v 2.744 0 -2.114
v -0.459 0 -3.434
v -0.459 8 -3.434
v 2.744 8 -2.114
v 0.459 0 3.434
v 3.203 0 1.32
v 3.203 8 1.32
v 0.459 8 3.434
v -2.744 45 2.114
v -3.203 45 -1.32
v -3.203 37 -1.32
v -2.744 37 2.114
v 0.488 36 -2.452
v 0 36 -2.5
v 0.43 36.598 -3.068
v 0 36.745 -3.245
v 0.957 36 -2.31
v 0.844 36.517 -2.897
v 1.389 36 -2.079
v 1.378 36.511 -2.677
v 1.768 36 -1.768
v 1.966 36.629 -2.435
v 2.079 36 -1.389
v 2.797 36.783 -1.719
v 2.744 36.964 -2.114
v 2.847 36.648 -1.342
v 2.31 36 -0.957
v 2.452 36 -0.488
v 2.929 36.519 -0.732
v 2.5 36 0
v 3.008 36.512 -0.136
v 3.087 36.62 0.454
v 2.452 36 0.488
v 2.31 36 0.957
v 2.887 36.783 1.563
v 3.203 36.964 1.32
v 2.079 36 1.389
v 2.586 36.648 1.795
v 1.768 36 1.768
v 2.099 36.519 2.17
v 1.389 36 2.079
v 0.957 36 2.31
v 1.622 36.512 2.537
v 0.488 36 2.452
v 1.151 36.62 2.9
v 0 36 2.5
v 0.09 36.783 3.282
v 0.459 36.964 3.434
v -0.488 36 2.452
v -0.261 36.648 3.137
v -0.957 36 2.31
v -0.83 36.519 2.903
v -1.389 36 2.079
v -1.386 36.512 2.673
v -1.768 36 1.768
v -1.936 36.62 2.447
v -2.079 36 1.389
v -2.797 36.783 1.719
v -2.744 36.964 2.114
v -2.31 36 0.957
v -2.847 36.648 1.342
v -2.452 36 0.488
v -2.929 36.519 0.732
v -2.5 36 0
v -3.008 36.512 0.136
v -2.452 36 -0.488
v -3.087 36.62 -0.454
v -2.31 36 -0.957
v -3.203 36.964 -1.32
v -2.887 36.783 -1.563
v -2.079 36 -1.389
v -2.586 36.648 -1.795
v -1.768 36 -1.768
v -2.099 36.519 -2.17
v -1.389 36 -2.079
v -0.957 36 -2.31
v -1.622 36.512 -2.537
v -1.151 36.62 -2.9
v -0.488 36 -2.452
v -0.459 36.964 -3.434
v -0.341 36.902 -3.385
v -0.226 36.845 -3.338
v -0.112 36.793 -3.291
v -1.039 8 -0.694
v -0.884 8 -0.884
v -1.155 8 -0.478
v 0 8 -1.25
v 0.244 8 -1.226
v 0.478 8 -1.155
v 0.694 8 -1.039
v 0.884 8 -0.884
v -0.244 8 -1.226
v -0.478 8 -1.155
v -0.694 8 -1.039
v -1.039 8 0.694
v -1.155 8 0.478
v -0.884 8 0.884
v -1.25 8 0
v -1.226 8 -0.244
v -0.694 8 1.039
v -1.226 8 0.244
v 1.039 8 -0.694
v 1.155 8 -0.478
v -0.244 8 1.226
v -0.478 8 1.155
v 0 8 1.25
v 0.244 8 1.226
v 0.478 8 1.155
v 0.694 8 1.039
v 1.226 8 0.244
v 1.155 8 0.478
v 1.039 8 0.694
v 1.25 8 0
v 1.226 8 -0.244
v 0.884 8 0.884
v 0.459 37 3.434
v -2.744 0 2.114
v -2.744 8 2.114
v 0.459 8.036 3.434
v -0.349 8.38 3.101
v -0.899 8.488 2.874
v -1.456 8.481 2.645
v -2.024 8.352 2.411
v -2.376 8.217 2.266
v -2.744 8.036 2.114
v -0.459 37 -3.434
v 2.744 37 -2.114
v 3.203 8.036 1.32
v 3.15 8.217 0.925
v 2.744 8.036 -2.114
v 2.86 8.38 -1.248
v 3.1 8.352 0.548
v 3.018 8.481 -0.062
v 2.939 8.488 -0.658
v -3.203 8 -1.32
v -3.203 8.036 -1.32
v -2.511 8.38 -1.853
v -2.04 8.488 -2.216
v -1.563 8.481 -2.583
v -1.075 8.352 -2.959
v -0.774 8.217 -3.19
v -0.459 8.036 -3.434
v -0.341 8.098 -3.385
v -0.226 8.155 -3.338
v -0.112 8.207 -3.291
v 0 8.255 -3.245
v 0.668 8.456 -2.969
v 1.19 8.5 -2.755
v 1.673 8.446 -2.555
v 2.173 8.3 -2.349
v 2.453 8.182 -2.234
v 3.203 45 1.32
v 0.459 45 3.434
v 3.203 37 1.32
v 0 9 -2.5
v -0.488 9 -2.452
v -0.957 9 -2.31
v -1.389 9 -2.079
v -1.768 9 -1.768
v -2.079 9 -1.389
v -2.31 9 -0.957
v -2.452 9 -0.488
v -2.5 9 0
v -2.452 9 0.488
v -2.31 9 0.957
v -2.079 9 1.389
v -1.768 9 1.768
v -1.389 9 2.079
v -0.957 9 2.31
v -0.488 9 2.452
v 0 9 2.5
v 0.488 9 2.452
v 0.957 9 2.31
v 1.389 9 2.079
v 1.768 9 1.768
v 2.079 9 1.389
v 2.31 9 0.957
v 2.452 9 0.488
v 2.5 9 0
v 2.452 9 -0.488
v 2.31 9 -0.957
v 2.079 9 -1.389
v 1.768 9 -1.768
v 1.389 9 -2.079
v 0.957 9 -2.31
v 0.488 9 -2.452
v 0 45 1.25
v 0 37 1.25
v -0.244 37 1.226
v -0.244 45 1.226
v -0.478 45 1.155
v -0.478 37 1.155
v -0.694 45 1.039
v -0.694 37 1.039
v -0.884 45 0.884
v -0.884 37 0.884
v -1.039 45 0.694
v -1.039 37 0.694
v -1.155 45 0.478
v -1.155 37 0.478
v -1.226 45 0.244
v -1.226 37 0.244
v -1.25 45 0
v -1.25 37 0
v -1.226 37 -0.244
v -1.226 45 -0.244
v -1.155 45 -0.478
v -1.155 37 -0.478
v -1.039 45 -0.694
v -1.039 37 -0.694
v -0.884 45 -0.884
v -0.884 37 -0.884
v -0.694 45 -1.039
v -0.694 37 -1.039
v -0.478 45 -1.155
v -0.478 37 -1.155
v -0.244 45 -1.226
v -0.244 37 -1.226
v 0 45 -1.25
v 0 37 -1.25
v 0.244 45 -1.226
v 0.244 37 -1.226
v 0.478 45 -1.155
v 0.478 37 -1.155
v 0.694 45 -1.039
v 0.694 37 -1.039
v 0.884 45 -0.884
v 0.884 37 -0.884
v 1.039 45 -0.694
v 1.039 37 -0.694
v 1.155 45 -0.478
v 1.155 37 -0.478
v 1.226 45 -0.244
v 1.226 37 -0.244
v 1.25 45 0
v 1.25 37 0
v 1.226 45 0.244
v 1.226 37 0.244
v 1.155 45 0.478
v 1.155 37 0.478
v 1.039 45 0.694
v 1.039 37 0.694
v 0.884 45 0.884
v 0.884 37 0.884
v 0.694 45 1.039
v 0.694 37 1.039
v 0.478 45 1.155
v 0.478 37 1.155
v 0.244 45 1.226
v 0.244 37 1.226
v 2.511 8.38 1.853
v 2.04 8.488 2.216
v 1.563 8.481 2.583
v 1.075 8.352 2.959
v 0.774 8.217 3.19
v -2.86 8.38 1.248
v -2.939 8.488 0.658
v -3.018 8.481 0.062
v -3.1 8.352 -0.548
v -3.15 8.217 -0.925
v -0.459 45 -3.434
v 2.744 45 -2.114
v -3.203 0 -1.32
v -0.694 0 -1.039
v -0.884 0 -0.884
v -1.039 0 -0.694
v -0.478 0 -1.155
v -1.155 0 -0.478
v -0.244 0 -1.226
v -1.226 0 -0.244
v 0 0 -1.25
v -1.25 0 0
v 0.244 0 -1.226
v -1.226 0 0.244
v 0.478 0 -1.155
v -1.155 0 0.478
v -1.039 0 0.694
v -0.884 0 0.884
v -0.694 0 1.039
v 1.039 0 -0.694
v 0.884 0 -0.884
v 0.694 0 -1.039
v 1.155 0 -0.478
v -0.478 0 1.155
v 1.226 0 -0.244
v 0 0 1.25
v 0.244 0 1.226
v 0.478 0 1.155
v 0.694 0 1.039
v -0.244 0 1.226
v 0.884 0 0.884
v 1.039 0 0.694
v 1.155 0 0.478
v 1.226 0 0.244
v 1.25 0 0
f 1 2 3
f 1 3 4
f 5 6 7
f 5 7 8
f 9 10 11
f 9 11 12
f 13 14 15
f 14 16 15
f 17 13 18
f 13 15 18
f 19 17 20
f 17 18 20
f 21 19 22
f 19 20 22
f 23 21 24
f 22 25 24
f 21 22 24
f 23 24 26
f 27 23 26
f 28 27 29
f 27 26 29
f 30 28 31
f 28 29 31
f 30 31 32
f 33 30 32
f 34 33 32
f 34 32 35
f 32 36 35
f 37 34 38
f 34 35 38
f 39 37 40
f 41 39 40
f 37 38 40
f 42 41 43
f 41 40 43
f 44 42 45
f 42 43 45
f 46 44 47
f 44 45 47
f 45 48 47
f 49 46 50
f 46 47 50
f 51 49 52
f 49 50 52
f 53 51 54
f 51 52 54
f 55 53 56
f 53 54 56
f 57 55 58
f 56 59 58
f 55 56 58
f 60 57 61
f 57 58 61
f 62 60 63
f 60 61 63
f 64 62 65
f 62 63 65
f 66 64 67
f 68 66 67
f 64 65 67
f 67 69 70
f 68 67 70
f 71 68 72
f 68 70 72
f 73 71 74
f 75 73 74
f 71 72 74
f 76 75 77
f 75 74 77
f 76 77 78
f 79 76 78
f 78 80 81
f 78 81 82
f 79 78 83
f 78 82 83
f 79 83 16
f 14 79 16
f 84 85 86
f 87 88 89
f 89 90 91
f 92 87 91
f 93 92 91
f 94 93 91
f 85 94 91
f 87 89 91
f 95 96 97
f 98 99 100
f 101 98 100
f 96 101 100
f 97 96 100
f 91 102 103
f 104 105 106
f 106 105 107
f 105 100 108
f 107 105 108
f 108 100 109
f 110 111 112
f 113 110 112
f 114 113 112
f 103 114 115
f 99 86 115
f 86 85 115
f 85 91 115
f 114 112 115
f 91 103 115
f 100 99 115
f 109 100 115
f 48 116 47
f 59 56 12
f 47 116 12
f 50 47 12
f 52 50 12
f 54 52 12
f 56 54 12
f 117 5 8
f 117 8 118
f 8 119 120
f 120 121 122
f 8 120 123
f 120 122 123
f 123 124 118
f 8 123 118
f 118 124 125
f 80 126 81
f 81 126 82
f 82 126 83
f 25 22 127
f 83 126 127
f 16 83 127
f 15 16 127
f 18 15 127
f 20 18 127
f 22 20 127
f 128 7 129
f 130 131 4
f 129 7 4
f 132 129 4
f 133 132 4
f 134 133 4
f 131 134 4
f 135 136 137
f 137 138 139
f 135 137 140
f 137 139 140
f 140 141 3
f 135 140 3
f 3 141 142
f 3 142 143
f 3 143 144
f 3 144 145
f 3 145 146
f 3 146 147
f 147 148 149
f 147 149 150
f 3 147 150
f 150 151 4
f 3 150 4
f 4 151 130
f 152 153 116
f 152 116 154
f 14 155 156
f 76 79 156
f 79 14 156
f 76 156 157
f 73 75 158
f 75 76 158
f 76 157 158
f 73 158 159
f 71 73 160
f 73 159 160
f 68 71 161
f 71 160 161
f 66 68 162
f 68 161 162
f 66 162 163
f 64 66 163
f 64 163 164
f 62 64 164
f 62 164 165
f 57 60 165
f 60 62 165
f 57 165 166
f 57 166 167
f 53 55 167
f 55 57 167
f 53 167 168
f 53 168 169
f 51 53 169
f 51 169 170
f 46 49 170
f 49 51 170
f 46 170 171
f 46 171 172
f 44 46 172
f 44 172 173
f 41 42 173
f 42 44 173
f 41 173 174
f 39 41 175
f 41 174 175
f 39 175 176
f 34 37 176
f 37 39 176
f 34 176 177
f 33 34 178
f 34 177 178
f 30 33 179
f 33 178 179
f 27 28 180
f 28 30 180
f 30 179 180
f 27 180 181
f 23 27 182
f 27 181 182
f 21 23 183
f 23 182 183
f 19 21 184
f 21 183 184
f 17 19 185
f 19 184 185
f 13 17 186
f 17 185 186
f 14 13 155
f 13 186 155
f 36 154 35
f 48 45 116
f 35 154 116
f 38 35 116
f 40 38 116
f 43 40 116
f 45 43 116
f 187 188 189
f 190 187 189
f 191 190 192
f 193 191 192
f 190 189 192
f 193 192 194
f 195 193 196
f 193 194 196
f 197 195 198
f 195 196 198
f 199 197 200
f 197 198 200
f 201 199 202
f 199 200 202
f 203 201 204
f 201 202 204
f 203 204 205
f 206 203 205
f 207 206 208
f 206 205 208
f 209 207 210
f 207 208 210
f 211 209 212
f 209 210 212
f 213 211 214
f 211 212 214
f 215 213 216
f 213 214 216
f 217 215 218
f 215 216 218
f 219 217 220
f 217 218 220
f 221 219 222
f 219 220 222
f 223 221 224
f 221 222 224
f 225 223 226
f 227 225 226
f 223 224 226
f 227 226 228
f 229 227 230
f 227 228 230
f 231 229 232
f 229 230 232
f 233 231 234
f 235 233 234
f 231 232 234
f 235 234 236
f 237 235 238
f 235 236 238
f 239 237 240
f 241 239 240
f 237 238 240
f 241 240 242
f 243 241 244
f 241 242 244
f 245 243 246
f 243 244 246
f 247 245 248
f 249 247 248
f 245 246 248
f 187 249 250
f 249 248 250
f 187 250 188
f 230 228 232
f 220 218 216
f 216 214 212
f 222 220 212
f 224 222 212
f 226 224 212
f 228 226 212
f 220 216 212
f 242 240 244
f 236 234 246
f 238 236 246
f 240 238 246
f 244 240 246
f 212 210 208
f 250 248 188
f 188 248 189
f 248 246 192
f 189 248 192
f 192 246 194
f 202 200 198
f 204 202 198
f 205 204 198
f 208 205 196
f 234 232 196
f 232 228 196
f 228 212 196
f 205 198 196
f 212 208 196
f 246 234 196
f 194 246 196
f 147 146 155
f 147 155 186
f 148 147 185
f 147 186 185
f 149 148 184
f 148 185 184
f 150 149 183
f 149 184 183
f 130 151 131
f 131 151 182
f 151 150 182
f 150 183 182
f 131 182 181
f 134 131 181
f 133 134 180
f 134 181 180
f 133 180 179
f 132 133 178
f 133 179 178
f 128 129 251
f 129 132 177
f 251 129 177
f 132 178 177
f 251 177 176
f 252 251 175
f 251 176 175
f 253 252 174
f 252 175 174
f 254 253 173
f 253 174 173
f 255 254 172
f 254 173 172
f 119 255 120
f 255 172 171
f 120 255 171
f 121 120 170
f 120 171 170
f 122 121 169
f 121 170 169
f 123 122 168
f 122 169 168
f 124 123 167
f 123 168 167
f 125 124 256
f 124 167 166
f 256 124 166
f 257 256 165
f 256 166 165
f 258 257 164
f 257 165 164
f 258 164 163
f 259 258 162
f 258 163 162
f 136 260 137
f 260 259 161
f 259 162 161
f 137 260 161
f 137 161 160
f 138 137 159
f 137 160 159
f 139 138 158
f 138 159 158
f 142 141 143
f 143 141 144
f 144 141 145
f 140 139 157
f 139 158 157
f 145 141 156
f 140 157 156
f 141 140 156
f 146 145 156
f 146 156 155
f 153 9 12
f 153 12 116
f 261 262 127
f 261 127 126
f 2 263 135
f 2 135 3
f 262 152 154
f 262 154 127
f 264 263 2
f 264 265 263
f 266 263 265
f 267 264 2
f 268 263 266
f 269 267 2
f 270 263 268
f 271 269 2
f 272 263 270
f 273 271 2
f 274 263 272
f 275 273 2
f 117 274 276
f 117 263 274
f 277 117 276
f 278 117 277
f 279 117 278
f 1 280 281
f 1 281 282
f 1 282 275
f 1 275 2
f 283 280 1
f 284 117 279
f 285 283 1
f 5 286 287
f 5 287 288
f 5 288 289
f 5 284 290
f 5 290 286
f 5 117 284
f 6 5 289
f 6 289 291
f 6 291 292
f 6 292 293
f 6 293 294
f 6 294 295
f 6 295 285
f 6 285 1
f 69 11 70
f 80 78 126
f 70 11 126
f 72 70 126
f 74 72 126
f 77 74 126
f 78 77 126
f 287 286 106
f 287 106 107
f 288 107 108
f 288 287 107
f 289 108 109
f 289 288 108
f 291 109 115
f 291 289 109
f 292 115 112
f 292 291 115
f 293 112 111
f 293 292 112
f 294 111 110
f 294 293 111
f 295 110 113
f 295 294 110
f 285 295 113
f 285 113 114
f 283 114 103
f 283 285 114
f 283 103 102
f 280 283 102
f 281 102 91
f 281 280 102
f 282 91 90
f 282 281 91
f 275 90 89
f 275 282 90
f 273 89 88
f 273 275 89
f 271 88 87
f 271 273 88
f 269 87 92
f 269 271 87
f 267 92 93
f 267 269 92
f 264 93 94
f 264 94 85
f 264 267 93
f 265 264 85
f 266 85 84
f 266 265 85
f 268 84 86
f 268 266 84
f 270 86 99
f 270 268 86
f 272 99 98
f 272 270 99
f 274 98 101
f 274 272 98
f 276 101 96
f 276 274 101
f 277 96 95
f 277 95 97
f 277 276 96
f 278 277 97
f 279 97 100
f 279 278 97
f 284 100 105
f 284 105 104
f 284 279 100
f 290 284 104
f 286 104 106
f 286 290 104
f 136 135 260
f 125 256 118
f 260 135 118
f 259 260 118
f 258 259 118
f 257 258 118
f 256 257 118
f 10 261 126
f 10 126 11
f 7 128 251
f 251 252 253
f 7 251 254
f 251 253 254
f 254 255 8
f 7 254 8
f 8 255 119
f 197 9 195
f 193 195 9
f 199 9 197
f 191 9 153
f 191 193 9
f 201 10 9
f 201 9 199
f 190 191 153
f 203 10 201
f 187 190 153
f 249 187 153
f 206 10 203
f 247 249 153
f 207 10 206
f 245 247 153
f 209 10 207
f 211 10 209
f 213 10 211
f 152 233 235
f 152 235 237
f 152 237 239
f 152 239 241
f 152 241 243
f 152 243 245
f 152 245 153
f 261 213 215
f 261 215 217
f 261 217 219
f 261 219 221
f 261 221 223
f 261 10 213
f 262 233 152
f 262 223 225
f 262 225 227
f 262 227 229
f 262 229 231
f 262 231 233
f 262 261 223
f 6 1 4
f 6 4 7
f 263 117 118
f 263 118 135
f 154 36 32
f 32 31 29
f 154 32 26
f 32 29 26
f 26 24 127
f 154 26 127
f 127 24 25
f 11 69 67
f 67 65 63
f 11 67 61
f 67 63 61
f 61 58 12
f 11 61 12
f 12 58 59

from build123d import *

# Parameters (mm, degrees)
SKETCH_1_R          = 2.5
EXTRUDE_1_DEPTH     = 45
EXTRUDE_2_DEPTH     = 8
EXTRUDE_3_DEPTH     = 8
CHAMFER_1_SIZE      = 1
SKETCH_4_R          = 1.25
CUT_EXTRUDE_1_DEPTH = 8
CUT_EXTRUDE_START   = 8
SKETCH_5_R          = 1.25
CUT_EXTRUDE_2_DEPTH = 8


with BuildPart() as part:
    # 草图1 → 凸台-拉伸1 (new body)
    with BuildSketch(Plane(origin=(0, 0, 0), x_dir=(1, 0, 0), z_dir=(0, 1, 0))):
        with Locations(Location((0, 0, 0), (0, 0, 90))):
            Circle(SKETCH_1_R)
    extrude(amount=EXTRUDE_1_DEPTH)

    # 草图2 → 凸台-拉伸2 (add)
    with BuildSketch(Plane(origin=(0, 45, 0), x_dir=(1, 0, 0), z_dir=(0, 1, 0))):
        Polygon((3.202903935, -1.319623577), (2.744279509, 2.113984385), (-0.458624426, 3.433607962), (-3.202903935, 1.319623577), (-2.744279509, -2.113984385), (0.458624426, -3.433607962), align=None)
    extrude(amount=-EXTRUDE_2_DEPTH)

    # 草图3 → 凸台-拉伸3 (add)
    with BuildSketch(Plane.XZ):
        Polygon((3.202903935, 1.319623577), (0.458624426, 3.433607962), (-2.744279509, 2.113984385), (-3.202903935, -1.319623577), (-0.458624426, -3.433607962), (2.744279509, -2.113984385), align=None)
    extrude(amount=-EXTRUDE_3_DEPTH)

    # 倒角1
    # the kernel refuses this chamfer: 1 mm, written as the material it adds along each edge
    with BuildSketch(Plane(origin=(0, 37, 0), x_dir=(0, 0, -1), z_dir=(-1, 0, 0))) as chamfer_1_piece_1_section:
        Polygon((2.5, CHAMFER_1_SIZE), (2.5 + CHAMFER_1_SIZE, 0), (2.5, 0), align=None)
    chamfer_1_piece_1 = revolve(axis=Axis((0, 37, 0), (0, -1, 0)), mode=Mode.PRIVATE)
    chamfer_1_piece_1 = split(chamfer_1_piece_1, bisect_by=Plane(origin=(3.361202761, 36.482096178, 2.504767848), z_dir=(-0.9911972405355005, 0, 0.13239346794615373)), keep=Keep.TOP, mode=Mode.PRIVATE)
    chamfer_1_piece_1 = split(chamfer_1_piece_1, bisect_by=Plane(origin=(0.402796537, 36.482096178, 3.476613525), z_dir=(-0.61025472680424, 0, -0.7922052564917015)), keep=Keep.TOP, mode=Mode.PRIVATE)
    chamfer_1_piece_1 = split(chamfer_1_piece_1, bisect_by=Plane(origin=(2.183184145, 36.482096178, -2.345160432), z_dir=(-0.3809425137312606, 0, 0.924598724437855)), keep=Keep.TOP, mode=Mode.PRIVATE)
    chamfer_1_piece_1 = split(chamfer_1_piece_1, bisect_by=Plane(origin=(-0.102470937, 36.482096178, 3.202431915), z_dir=(0.38094251373126053, 0, -0.924598724437855)), keep=Keep.TOP, mode=Mode.PRIVATE)
    chamfer_1_piece_1 = split(chamfer_1_piece_1, bisect_by=Plane(origin=(-3.258731824, 36.482096178, -1.276618014), z_dir=(0.6102547268042401, 0, 0.7922052564917015)), keep=Keep.TOP, mode=Mode.PRIVATE)
    chamfer_1_piece_1 = split(chamfer_1_piece_1, bisect_by=Plane(origin=(-2.585980682, 36.482096178, 3.299128656), z_dir=(0.9911972405355005, 0, -0.1323934679461537)), keep=Keep.TOP, mode=Mode.PRIVATE)
    add(chamfer_1_piece_1)
    with BuildSketch(Plane(origin=(0, 8, 0), x_dir=(0, 0, -1), z_dir=(-1, 0, 0))) as chamfer_1_piece_2_section:
        Polygon((2.5 + CHAMFER_1_SIZE, 0), (2.5, -CHAMFER_1_SIZE), (2.5, 0), align=None)
    chamfer_1_piece_2 = revolve(axis=Axis((0, 8, 0), (0, -1, 0)), mode=Mode.PRIVATE)
    chamfer_1_piece_2 = split(chamfer_1_piece_2, bisect_by=Plane(origin=(0.402796537, 8.517903822, 3.476613525), z_dir=(-0.61025472680424, 0, -0.7922052564917015)), keep=Keep.TOP, mode=Mode.PRIVATE)
    chamfer_1_piece_2 = split(chamfer_1_piece_2, bisect_by=Plane(origin=(3.361202761, 8.517903822, 2.504767848), z_dir=(-0.9911972405355005, 0, 0.13239346794615373)), keep=Keep.TOP, mode=Mode.PRIVATE)
    chamfer_1_piece_2 = split(chamfer_1_piece_2, bisect_by=Plane(origin=(-0.102470937, 8.517903822, 3.202431915), z_dir=(0.38094251373126053, 0, -0.924598724437855)), keep=Keep.TOP, mode=Mode.PRIVATE)
    chamfer_1_piece_2 = split(chamfer_1_piece_2, bisect_by=Plane(origin=(2.183184145, 8.517903822, -2.345160432), z_dir=(-0.3809425137312606, 0, 0.924598724437855)), keep=Keep.TOP, mode=Mode.PRIVATE)
    chamfer_1_piece_2 = split(chamfer_1_piece_2, bisect_by=Plane(origin=(-2.585980682, 8.517903822, 3.299128656), z_dir=(0.9911972405355005, 0, -0.1323934679461537)), keep=Keep.TOP, mode=Mode.PRIVATE)
    chamfer_1_piece_2 = split(chamfer_1_piece_2, bisect_by=Plane(origin=(-3.258731824, 8.517903822, -1.276618014), z_dir=(0.6102547268042401, 0, 0.7922052564917015)), keep=Keep.TOP, mode=Mode.PRIVATE)
    add(chamfer_1_piece_2)

    # 草图4 → 切除-拉伸1 (cut)
    with BuildSketch(Plane(origin=(0, 0, 0), x_dir=(-1, 0, 0), z_dir=(0, 1, 0))):
        with Locations(Location((0, 0, 0), (0, 0, 90))):
            Circle(SKETCH_4_R)
    extrude(amount=CUT_EXTRUDE_1_DEPTH, mode=Mode.SUBTRACT)

    # 草图5 → 切除-拉伸2 (cut)
    with BuildSketch(Plane(origin=(0, 45, 0), x_dir=(-1, 0, 0), z_dir=(0, -1, 0)).offset(CUT_EXTRUDE_START)):
        with Locations(Location((0, 0, 0), (0, 0, 270))):
            Circle(SKETCH_5_R)
    extrude(amount=-CUT_EXTRUDE_2_DEPTH, mode=Mode.SUBTRACT)


solid = part.part
